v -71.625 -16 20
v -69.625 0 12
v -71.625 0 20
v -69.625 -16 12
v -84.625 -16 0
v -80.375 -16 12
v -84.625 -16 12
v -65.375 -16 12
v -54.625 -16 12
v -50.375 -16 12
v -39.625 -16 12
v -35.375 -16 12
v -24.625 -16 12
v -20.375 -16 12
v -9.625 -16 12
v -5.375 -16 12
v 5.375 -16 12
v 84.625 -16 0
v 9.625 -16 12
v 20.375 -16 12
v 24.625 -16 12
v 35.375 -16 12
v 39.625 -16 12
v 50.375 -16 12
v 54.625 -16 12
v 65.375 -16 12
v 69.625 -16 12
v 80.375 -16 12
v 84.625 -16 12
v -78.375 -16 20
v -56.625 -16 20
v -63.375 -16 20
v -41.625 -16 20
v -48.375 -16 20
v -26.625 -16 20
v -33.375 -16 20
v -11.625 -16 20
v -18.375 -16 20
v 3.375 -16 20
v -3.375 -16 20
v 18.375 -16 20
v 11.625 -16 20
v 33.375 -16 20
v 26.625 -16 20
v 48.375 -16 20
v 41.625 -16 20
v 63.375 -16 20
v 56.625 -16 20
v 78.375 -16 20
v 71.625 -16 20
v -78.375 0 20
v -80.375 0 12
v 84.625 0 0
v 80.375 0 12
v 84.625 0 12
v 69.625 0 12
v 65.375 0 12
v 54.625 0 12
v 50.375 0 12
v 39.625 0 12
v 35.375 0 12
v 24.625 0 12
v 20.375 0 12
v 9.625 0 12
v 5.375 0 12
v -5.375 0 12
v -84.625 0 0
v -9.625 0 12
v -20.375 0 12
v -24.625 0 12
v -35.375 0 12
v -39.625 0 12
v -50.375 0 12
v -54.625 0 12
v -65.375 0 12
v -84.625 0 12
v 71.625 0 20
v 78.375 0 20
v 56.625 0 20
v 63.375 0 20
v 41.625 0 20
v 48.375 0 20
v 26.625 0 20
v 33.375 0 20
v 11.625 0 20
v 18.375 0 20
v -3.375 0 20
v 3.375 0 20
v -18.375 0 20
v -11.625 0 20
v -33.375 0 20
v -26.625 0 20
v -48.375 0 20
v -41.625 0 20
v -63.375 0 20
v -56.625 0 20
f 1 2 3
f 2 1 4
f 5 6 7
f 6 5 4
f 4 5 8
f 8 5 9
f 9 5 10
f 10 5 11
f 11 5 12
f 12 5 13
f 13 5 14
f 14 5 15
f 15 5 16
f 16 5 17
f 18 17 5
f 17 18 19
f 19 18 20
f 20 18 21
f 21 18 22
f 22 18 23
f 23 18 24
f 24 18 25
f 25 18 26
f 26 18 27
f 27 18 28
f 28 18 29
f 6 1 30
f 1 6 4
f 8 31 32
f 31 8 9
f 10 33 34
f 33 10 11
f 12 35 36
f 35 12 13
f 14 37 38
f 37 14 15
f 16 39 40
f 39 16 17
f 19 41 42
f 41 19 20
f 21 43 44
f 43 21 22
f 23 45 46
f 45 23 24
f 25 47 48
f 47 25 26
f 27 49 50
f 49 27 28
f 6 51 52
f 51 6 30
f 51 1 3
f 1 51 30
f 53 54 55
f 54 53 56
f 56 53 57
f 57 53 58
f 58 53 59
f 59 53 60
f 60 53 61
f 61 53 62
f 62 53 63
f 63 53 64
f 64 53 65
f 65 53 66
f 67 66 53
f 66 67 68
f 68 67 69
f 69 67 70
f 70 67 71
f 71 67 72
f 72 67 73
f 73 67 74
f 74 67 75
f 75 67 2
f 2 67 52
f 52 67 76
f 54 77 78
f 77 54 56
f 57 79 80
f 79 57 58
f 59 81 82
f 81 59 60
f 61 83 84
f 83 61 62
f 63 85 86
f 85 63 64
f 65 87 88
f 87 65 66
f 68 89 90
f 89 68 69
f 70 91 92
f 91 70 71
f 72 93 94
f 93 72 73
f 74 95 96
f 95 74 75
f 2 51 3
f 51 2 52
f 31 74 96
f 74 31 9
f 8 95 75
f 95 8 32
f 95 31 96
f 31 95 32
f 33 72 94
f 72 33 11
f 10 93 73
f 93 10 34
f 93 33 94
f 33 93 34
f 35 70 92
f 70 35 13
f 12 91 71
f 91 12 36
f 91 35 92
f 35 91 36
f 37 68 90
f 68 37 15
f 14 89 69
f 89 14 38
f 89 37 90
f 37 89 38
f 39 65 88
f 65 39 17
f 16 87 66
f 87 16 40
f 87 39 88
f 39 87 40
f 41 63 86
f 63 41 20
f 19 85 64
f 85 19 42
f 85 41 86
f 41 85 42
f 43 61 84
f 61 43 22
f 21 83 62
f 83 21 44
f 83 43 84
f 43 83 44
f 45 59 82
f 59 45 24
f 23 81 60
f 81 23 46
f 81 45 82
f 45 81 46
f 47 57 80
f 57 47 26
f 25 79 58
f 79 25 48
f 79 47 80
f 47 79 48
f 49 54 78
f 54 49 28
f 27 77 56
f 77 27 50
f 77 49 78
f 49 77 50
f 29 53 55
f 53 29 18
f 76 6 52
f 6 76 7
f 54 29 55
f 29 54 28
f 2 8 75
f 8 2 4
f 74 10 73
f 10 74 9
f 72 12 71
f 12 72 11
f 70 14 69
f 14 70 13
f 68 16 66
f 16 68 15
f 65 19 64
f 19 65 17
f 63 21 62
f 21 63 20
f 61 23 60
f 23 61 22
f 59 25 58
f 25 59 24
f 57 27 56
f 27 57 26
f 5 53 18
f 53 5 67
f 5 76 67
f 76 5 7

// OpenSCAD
$fn = 32;

// ----------------------------------------------------------------------
// Toothed rack, 11 teeth
// 15 mm pitch, 8 mm teeth
// ----------------------------------------------------------------------

// --- parameters (mm) ---
bar_w = 16;      // bar width (Y)
bar_h = 12;      // bar height (Z)
teeth = 11;      // number of teeth
pitch = 15;      // tooth pitch
tooth_h = 8;     // tooth height above the bar
root_w = 11.25;  // tooth width at the root
crest_w = 6.75;  // tooth width at the crest

// --- derived feature positions (mm) ---
span = (teeth - 1) * pitch;  // = 150   distance between the outer teeth
bar_l = span + root_w + 8;   // = 169.25   bar length: teeth plus 4 mm at each end
tooth_x = -span / 2;         // = -75   X of the first tooth
height = bar_h + tooth_h;    // = 20   overall height
feature_centers = [
  [tooth_x + 0 * pitch, -bar_w / 2],
  [tooth_x + 1 * pitch, -bar_w / 2],
  [tooth_x + 2 * pitch, -bar_w / 2],
  [tooth_x + 3 * pitch, -bar_w / 2],
  [tooth_x + 4 * pitch, -bar_w / 2],
  [tooth_x + 5 * pitch, -bar_w / 2],
  [tooth_x + 6 * pitch, -bar_w / 2],
  [tooth_x + 7 * pitch, -bar_w / 2],
  [tooth_x + 8 * pitch, -bar_w / 2],
  [tooth_x + 9 * pitch, -bar_w / 2],
  [tooth_x + 10 * pitch, -bar_w / 2]
];   // tooth centre line, drives the tooth loop

// bar with a rack of teeth, one extruded trapezoium per centre
module rack_tooth() {
  linear_extrude(height = bar_w)
    polygon(points = [
      [0, 0],
      [root_w, 0],
      [root_w / 2 + crest_w / 2, tooth_h + 1],
      [root_w / 2 - crest_w / 2, tooth_h + 1]
    ]);
}

union() {
  translate([-bar_l / 2, -bar_w, 0]) cube([bar_l, bar_w, bar_h]);
  for (centre = feature_centers)
    translate([centre[0] - root_w / 2, 0, bar_h - 1]) rotate([90, 0, 0]) rack_tooth();
}
